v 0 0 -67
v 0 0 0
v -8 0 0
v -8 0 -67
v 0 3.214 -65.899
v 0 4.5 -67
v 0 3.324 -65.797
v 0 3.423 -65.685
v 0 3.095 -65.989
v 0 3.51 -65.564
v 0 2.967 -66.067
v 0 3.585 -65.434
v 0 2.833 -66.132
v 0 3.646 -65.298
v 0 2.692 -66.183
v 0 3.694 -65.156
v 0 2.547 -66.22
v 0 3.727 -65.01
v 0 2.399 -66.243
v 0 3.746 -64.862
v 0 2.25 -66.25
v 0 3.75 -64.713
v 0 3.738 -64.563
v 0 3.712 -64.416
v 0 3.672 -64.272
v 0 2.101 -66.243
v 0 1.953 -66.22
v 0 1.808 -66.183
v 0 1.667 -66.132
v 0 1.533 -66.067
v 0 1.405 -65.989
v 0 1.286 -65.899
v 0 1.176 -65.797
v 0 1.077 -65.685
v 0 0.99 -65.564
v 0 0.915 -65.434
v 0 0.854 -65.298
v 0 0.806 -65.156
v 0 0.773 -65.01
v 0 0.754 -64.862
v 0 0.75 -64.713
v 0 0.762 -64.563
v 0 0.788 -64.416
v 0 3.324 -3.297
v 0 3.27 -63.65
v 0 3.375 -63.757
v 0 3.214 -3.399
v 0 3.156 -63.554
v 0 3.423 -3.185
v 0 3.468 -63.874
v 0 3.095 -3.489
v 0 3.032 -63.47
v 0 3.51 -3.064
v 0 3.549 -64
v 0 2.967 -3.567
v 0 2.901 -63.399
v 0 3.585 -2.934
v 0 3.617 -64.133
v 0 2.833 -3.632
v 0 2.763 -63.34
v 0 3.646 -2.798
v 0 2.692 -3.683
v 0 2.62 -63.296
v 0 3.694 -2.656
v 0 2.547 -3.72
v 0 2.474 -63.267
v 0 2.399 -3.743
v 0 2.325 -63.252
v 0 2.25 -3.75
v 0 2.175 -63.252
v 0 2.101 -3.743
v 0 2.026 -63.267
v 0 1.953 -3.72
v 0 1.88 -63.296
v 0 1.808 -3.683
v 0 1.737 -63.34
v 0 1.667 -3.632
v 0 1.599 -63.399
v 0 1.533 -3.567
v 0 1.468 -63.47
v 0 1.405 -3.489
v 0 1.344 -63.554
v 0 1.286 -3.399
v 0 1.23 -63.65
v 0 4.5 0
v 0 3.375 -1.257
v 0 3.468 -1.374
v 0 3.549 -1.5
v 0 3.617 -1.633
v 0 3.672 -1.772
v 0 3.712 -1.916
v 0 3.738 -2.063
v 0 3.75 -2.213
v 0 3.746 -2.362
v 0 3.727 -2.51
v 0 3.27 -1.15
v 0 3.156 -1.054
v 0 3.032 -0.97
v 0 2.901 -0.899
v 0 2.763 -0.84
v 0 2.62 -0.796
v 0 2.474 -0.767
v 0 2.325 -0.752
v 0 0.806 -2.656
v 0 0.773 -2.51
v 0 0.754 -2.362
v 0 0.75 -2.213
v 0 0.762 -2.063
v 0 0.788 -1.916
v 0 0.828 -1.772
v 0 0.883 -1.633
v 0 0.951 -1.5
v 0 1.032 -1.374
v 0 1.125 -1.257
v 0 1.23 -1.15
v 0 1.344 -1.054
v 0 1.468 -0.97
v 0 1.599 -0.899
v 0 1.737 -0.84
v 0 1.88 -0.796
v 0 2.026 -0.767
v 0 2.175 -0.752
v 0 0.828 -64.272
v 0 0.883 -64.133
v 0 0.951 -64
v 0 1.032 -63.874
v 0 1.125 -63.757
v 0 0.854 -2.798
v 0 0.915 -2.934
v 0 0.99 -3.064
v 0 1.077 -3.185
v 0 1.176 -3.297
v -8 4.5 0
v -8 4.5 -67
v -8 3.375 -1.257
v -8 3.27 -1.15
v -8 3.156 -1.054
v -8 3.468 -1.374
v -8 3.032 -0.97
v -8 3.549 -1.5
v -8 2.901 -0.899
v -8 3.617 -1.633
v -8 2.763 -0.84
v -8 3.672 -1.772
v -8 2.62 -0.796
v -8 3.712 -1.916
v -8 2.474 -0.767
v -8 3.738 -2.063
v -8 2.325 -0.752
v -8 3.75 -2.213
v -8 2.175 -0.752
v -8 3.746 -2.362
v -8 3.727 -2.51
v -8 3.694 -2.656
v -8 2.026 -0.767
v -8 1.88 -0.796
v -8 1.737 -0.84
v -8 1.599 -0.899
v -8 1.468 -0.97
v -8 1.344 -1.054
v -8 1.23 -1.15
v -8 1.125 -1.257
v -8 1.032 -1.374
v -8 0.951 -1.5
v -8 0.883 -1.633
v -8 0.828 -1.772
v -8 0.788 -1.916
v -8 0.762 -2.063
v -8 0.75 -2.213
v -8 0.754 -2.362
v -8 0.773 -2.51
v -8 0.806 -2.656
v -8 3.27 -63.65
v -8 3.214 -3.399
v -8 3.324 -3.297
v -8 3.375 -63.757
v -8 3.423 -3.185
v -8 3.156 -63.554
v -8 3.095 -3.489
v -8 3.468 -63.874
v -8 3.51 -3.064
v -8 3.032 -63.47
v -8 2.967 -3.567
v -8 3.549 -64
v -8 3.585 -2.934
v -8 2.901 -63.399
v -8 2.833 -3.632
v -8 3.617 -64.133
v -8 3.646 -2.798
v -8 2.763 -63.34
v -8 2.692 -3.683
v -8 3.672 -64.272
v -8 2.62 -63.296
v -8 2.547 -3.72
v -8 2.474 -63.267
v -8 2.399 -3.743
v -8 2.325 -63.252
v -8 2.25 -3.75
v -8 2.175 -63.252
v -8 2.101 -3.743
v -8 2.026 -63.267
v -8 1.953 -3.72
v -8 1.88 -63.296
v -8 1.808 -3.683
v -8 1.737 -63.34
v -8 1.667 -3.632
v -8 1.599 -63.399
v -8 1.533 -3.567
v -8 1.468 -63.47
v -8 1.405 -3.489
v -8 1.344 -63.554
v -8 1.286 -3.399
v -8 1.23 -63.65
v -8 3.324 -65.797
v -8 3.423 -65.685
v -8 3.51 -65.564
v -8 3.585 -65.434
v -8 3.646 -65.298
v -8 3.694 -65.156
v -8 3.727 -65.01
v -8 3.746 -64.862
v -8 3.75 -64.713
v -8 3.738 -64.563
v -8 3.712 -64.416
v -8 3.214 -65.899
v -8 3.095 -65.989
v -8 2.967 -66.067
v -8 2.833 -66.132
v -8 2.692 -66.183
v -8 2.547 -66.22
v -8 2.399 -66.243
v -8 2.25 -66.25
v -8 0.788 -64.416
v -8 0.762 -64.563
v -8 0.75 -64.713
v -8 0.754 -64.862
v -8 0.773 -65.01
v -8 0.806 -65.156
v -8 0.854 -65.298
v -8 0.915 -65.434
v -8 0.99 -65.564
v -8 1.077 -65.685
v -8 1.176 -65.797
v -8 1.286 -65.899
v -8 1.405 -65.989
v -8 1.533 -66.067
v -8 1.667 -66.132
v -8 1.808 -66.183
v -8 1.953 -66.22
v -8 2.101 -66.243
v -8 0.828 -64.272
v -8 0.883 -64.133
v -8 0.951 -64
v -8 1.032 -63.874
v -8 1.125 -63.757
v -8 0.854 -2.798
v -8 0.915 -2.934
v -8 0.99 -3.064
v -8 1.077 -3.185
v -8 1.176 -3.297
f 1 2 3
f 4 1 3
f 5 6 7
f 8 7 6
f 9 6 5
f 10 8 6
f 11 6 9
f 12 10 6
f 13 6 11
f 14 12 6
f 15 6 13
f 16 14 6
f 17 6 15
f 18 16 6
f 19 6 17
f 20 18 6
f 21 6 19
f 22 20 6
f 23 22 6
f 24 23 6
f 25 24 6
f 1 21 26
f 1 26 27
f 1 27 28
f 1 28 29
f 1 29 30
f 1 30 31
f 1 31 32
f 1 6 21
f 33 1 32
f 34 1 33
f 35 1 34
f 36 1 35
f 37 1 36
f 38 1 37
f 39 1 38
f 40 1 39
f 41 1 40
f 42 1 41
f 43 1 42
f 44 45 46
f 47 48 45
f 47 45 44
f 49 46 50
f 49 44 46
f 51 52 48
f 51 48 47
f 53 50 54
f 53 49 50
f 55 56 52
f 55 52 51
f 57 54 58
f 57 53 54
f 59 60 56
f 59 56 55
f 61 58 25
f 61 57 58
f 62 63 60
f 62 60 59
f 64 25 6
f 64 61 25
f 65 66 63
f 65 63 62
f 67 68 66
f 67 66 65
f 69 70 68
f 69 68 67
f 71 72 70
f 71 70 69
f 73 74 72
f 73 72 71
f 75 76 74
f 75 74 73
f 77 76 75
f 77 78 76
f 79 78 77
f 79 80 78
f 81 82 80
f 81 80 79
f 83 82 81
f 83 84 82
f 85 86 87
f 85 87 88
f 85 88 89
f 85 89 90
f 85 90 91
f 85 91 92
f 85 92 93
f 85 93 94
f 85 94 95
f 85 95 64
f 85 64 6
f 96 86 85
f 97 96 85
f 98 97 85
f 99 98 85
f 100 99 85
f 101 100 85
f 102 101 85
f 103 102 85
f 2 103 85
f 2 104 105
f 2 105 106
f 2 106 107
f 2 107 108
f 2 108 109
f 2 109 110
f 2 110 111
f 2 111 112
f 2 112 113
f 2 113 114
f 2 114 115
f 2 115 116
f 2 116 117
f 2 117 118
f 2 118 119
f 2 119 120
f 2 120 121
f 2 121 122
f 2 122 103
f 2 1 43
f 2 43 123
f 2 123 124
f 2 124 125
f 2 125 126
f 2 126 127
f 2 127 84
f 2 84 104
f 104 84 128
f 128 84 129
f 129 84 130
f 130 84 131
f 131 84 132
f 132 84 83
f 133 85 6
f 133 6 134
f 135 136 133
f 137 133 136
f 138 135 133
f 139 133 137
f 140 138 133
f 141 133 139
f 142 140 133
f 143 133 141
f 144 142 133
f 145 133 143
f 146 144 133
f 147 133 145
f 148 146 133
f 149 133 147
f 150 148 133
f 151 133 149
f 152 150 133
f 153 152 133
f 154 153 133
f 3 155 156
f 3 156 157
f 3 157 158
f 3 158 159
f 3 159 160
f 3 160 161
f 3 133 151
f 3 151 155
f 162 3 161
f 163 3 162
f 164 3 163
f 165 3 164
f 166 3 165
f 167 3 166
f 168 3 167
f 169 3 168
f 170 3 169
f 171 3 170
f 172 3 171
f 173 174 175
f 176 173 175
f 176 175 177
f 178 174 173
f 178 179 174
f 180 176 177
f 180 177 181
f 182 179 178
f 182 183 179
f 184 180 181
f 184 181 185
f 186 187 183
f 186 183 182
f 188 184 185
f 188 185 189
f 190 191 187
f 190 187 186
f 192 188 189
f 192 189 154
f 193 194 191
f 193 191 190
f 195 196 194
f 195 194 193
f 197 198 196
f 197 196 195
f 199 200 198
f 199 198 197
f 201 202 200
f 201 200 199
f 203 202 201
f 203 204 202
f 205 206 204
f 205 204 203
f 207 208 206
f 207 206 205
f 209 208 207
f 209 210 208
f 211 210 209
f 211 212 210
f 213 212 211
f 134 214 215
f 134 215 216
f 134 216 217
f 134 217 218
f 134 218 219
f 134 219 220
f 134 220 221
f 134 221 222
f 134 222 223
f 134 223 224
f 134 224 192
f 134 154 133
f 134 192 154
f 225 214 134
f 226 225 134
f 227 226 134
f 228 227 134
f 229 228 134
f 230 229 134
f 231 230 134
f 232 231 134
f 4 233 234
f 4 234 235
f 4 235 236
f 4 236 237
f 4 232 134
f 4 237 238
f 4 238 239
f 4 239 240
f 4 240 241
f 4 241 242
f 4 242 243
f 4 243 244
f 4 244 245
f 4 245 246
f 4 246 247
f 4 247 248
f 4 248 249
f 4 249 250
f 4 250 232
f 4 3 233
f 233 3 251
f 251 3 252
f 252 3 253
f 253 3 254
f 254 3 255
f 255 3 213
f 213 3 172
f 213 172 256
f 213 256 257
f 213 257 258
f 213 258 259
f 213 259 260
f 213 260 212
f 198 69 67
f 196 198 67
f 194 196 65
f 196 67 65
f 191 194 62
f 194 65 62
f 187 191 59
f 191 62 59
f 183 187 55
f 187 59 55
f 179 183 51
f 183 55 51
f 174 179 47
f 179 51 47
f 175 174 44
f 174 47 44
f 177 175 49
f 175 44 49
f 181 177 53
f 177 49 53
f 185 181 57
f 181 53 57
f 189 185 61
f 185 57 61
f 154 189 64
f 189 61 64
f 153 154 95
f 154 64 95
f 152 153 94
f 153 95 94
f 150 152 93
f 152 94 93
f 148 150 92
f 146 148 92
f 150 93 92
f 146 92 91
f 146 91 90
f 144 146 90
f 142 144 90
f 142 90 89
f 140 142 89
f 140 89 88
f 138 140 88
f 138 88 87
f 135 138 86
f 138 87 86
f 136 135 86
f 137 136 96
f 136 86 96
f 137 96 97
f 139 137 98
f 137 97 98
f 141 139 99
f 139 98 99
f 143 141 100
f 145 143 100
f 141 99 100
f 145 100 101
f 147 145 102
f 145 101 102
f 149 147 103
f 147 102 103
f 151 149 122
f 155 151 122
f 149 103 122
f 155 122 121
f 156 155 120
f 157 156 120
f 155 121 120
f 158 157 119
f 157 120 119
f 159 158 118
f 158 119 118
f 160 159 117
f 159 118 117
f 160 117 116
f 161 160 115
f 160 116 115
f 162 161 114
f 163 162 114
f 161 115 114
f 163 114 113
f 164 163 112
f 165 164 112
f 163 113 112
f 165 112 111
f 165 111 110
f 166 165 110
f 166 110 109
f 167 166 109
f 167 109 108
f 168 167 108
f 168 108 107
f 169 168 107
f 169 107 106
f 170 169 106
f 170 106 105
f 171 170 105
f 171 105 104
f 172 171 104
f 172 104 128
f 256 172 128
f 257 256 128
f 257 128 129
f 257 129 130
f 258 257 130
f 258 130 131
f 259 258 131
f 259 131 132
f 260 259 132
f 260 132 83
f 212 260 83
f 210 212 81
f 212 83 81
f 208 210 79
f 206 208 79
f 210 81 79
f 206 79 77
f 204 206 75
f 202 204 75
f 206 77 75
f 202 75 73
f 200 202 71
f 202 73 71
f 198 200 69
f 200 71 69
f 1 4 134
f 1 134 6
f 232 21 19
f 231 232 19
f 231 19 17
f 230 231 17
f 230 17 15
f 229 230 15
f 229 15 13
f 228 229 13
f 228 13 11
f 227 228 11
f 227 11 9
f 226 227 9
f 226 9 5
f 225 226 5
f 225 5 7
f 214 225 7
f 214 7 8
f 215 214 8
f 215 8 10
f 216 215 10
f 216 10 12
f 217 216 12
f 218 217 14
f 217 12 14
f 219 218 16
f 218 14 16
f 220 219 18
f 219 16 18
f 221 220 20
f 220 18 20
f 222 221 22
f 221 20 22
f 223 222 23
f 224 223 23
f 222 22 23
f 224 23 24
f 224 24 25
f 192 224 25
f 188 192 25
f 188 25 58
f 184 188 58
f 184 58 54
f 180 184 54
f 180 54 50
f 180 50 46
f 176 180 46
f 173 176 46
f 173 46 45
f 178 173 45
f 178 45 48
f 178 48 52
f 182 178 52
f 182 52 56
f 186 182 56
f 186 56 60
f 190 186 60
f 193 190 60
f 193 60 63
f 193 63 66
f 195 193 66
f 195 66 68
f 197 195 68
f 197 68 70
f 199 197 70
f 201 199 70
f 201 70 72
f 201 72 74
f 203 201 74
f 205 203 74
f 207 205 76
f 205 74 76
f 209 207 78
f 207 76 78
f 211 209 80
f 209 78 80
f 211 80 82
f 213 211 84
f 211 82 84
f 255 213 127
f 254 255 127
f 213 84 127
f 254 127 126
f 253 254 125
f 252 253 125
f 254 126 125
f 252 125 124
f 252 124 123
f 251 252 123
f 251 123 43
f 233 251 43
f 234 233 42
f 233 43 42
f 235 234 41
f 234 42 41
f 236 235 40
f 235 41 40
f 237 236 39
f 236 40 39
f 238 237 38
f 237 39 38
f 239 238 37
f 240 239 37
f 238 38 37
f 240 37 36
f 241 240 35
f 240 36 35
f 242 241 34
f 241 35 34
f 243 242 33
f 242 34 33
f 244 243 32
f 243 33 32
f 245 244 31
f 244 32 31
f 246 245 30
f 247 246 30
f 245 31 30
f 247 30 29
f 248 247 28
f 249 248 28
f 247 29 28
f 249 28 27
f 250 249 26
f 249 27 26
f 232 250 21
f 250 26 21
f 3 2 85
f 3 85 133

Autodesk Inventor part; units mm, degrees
ref_plane "YZ Plane" through (0, 0, 0) normal (1, 0, 0) x (0, 1, 0)
ref_plane "XZ Plane" through (0, 0, 0) normal (0, 1, 0) x (-1, 0, 0)
ref_plane "XY Plane" through (0, 0, 0) normal (0, 0, 1) x (1, 0, 0)
sketch "Sketch1" plane through (0, 0, 0) normal (0, 1, 0) x (-1, 0, 0)
  line L0 (0, 0) -> (8, 0)
  line L1 (8, 0) -> (8, -67)
  line L2 (8, -67) -> (0, -67)
  line L3 (0, -67) -> (0, 0)
  dimension "d0" = 8
  dimension "d1" = 67
extrude "Extrusion1" add sketch "Sketch1" along normal blind 4.5
sketch "Sketch2" plane through (0, 0, 0) normal (1, 0, 0) x (0, 0, -1)
  line L0 (0, 0) -> (0, 4.5) projected
  line L1 (0, 4.5) -> (2.25, 4.5)
  line L2 (2.25, 4.5) -> (2.25, 2.25)
  line L3 (2.25, 2.25) -> (0, 2.25)
  line L4 (0, 2.25) -> (0, 4.5)
  circle A0 centre (2.25, 2.25) radius 1.5
  line L5 (67, 0) -> (67, 4.5) projected
  line L6 (67, 4.5) -> (64.75, 4.5)
  line L7 (64.75, 4.5) -> (64.75, 2.25)
  line L8 (64.75, 2.25) -> (67, 2.25)
  line L9 (67, 2.25) -> (67, 4.5)
  circle A1 centre (64.75, 2.25) radius 1.5
  dimension "d4" = 2.25
  dimension "d5" = 2.25
  dimension "d6" = 3
  dimension "d7" = 2.25
  dimension "d8" = 2.25
  dimension "d9" = 3
extrude "Extrusion2" cut sketch "Sketch2" against normal blind 10 contours A0 L2 L3 | L3 L2 A0 | A1 L7 L8 | L8 L7 A1
properties part number "suport4_pcb_temp"
